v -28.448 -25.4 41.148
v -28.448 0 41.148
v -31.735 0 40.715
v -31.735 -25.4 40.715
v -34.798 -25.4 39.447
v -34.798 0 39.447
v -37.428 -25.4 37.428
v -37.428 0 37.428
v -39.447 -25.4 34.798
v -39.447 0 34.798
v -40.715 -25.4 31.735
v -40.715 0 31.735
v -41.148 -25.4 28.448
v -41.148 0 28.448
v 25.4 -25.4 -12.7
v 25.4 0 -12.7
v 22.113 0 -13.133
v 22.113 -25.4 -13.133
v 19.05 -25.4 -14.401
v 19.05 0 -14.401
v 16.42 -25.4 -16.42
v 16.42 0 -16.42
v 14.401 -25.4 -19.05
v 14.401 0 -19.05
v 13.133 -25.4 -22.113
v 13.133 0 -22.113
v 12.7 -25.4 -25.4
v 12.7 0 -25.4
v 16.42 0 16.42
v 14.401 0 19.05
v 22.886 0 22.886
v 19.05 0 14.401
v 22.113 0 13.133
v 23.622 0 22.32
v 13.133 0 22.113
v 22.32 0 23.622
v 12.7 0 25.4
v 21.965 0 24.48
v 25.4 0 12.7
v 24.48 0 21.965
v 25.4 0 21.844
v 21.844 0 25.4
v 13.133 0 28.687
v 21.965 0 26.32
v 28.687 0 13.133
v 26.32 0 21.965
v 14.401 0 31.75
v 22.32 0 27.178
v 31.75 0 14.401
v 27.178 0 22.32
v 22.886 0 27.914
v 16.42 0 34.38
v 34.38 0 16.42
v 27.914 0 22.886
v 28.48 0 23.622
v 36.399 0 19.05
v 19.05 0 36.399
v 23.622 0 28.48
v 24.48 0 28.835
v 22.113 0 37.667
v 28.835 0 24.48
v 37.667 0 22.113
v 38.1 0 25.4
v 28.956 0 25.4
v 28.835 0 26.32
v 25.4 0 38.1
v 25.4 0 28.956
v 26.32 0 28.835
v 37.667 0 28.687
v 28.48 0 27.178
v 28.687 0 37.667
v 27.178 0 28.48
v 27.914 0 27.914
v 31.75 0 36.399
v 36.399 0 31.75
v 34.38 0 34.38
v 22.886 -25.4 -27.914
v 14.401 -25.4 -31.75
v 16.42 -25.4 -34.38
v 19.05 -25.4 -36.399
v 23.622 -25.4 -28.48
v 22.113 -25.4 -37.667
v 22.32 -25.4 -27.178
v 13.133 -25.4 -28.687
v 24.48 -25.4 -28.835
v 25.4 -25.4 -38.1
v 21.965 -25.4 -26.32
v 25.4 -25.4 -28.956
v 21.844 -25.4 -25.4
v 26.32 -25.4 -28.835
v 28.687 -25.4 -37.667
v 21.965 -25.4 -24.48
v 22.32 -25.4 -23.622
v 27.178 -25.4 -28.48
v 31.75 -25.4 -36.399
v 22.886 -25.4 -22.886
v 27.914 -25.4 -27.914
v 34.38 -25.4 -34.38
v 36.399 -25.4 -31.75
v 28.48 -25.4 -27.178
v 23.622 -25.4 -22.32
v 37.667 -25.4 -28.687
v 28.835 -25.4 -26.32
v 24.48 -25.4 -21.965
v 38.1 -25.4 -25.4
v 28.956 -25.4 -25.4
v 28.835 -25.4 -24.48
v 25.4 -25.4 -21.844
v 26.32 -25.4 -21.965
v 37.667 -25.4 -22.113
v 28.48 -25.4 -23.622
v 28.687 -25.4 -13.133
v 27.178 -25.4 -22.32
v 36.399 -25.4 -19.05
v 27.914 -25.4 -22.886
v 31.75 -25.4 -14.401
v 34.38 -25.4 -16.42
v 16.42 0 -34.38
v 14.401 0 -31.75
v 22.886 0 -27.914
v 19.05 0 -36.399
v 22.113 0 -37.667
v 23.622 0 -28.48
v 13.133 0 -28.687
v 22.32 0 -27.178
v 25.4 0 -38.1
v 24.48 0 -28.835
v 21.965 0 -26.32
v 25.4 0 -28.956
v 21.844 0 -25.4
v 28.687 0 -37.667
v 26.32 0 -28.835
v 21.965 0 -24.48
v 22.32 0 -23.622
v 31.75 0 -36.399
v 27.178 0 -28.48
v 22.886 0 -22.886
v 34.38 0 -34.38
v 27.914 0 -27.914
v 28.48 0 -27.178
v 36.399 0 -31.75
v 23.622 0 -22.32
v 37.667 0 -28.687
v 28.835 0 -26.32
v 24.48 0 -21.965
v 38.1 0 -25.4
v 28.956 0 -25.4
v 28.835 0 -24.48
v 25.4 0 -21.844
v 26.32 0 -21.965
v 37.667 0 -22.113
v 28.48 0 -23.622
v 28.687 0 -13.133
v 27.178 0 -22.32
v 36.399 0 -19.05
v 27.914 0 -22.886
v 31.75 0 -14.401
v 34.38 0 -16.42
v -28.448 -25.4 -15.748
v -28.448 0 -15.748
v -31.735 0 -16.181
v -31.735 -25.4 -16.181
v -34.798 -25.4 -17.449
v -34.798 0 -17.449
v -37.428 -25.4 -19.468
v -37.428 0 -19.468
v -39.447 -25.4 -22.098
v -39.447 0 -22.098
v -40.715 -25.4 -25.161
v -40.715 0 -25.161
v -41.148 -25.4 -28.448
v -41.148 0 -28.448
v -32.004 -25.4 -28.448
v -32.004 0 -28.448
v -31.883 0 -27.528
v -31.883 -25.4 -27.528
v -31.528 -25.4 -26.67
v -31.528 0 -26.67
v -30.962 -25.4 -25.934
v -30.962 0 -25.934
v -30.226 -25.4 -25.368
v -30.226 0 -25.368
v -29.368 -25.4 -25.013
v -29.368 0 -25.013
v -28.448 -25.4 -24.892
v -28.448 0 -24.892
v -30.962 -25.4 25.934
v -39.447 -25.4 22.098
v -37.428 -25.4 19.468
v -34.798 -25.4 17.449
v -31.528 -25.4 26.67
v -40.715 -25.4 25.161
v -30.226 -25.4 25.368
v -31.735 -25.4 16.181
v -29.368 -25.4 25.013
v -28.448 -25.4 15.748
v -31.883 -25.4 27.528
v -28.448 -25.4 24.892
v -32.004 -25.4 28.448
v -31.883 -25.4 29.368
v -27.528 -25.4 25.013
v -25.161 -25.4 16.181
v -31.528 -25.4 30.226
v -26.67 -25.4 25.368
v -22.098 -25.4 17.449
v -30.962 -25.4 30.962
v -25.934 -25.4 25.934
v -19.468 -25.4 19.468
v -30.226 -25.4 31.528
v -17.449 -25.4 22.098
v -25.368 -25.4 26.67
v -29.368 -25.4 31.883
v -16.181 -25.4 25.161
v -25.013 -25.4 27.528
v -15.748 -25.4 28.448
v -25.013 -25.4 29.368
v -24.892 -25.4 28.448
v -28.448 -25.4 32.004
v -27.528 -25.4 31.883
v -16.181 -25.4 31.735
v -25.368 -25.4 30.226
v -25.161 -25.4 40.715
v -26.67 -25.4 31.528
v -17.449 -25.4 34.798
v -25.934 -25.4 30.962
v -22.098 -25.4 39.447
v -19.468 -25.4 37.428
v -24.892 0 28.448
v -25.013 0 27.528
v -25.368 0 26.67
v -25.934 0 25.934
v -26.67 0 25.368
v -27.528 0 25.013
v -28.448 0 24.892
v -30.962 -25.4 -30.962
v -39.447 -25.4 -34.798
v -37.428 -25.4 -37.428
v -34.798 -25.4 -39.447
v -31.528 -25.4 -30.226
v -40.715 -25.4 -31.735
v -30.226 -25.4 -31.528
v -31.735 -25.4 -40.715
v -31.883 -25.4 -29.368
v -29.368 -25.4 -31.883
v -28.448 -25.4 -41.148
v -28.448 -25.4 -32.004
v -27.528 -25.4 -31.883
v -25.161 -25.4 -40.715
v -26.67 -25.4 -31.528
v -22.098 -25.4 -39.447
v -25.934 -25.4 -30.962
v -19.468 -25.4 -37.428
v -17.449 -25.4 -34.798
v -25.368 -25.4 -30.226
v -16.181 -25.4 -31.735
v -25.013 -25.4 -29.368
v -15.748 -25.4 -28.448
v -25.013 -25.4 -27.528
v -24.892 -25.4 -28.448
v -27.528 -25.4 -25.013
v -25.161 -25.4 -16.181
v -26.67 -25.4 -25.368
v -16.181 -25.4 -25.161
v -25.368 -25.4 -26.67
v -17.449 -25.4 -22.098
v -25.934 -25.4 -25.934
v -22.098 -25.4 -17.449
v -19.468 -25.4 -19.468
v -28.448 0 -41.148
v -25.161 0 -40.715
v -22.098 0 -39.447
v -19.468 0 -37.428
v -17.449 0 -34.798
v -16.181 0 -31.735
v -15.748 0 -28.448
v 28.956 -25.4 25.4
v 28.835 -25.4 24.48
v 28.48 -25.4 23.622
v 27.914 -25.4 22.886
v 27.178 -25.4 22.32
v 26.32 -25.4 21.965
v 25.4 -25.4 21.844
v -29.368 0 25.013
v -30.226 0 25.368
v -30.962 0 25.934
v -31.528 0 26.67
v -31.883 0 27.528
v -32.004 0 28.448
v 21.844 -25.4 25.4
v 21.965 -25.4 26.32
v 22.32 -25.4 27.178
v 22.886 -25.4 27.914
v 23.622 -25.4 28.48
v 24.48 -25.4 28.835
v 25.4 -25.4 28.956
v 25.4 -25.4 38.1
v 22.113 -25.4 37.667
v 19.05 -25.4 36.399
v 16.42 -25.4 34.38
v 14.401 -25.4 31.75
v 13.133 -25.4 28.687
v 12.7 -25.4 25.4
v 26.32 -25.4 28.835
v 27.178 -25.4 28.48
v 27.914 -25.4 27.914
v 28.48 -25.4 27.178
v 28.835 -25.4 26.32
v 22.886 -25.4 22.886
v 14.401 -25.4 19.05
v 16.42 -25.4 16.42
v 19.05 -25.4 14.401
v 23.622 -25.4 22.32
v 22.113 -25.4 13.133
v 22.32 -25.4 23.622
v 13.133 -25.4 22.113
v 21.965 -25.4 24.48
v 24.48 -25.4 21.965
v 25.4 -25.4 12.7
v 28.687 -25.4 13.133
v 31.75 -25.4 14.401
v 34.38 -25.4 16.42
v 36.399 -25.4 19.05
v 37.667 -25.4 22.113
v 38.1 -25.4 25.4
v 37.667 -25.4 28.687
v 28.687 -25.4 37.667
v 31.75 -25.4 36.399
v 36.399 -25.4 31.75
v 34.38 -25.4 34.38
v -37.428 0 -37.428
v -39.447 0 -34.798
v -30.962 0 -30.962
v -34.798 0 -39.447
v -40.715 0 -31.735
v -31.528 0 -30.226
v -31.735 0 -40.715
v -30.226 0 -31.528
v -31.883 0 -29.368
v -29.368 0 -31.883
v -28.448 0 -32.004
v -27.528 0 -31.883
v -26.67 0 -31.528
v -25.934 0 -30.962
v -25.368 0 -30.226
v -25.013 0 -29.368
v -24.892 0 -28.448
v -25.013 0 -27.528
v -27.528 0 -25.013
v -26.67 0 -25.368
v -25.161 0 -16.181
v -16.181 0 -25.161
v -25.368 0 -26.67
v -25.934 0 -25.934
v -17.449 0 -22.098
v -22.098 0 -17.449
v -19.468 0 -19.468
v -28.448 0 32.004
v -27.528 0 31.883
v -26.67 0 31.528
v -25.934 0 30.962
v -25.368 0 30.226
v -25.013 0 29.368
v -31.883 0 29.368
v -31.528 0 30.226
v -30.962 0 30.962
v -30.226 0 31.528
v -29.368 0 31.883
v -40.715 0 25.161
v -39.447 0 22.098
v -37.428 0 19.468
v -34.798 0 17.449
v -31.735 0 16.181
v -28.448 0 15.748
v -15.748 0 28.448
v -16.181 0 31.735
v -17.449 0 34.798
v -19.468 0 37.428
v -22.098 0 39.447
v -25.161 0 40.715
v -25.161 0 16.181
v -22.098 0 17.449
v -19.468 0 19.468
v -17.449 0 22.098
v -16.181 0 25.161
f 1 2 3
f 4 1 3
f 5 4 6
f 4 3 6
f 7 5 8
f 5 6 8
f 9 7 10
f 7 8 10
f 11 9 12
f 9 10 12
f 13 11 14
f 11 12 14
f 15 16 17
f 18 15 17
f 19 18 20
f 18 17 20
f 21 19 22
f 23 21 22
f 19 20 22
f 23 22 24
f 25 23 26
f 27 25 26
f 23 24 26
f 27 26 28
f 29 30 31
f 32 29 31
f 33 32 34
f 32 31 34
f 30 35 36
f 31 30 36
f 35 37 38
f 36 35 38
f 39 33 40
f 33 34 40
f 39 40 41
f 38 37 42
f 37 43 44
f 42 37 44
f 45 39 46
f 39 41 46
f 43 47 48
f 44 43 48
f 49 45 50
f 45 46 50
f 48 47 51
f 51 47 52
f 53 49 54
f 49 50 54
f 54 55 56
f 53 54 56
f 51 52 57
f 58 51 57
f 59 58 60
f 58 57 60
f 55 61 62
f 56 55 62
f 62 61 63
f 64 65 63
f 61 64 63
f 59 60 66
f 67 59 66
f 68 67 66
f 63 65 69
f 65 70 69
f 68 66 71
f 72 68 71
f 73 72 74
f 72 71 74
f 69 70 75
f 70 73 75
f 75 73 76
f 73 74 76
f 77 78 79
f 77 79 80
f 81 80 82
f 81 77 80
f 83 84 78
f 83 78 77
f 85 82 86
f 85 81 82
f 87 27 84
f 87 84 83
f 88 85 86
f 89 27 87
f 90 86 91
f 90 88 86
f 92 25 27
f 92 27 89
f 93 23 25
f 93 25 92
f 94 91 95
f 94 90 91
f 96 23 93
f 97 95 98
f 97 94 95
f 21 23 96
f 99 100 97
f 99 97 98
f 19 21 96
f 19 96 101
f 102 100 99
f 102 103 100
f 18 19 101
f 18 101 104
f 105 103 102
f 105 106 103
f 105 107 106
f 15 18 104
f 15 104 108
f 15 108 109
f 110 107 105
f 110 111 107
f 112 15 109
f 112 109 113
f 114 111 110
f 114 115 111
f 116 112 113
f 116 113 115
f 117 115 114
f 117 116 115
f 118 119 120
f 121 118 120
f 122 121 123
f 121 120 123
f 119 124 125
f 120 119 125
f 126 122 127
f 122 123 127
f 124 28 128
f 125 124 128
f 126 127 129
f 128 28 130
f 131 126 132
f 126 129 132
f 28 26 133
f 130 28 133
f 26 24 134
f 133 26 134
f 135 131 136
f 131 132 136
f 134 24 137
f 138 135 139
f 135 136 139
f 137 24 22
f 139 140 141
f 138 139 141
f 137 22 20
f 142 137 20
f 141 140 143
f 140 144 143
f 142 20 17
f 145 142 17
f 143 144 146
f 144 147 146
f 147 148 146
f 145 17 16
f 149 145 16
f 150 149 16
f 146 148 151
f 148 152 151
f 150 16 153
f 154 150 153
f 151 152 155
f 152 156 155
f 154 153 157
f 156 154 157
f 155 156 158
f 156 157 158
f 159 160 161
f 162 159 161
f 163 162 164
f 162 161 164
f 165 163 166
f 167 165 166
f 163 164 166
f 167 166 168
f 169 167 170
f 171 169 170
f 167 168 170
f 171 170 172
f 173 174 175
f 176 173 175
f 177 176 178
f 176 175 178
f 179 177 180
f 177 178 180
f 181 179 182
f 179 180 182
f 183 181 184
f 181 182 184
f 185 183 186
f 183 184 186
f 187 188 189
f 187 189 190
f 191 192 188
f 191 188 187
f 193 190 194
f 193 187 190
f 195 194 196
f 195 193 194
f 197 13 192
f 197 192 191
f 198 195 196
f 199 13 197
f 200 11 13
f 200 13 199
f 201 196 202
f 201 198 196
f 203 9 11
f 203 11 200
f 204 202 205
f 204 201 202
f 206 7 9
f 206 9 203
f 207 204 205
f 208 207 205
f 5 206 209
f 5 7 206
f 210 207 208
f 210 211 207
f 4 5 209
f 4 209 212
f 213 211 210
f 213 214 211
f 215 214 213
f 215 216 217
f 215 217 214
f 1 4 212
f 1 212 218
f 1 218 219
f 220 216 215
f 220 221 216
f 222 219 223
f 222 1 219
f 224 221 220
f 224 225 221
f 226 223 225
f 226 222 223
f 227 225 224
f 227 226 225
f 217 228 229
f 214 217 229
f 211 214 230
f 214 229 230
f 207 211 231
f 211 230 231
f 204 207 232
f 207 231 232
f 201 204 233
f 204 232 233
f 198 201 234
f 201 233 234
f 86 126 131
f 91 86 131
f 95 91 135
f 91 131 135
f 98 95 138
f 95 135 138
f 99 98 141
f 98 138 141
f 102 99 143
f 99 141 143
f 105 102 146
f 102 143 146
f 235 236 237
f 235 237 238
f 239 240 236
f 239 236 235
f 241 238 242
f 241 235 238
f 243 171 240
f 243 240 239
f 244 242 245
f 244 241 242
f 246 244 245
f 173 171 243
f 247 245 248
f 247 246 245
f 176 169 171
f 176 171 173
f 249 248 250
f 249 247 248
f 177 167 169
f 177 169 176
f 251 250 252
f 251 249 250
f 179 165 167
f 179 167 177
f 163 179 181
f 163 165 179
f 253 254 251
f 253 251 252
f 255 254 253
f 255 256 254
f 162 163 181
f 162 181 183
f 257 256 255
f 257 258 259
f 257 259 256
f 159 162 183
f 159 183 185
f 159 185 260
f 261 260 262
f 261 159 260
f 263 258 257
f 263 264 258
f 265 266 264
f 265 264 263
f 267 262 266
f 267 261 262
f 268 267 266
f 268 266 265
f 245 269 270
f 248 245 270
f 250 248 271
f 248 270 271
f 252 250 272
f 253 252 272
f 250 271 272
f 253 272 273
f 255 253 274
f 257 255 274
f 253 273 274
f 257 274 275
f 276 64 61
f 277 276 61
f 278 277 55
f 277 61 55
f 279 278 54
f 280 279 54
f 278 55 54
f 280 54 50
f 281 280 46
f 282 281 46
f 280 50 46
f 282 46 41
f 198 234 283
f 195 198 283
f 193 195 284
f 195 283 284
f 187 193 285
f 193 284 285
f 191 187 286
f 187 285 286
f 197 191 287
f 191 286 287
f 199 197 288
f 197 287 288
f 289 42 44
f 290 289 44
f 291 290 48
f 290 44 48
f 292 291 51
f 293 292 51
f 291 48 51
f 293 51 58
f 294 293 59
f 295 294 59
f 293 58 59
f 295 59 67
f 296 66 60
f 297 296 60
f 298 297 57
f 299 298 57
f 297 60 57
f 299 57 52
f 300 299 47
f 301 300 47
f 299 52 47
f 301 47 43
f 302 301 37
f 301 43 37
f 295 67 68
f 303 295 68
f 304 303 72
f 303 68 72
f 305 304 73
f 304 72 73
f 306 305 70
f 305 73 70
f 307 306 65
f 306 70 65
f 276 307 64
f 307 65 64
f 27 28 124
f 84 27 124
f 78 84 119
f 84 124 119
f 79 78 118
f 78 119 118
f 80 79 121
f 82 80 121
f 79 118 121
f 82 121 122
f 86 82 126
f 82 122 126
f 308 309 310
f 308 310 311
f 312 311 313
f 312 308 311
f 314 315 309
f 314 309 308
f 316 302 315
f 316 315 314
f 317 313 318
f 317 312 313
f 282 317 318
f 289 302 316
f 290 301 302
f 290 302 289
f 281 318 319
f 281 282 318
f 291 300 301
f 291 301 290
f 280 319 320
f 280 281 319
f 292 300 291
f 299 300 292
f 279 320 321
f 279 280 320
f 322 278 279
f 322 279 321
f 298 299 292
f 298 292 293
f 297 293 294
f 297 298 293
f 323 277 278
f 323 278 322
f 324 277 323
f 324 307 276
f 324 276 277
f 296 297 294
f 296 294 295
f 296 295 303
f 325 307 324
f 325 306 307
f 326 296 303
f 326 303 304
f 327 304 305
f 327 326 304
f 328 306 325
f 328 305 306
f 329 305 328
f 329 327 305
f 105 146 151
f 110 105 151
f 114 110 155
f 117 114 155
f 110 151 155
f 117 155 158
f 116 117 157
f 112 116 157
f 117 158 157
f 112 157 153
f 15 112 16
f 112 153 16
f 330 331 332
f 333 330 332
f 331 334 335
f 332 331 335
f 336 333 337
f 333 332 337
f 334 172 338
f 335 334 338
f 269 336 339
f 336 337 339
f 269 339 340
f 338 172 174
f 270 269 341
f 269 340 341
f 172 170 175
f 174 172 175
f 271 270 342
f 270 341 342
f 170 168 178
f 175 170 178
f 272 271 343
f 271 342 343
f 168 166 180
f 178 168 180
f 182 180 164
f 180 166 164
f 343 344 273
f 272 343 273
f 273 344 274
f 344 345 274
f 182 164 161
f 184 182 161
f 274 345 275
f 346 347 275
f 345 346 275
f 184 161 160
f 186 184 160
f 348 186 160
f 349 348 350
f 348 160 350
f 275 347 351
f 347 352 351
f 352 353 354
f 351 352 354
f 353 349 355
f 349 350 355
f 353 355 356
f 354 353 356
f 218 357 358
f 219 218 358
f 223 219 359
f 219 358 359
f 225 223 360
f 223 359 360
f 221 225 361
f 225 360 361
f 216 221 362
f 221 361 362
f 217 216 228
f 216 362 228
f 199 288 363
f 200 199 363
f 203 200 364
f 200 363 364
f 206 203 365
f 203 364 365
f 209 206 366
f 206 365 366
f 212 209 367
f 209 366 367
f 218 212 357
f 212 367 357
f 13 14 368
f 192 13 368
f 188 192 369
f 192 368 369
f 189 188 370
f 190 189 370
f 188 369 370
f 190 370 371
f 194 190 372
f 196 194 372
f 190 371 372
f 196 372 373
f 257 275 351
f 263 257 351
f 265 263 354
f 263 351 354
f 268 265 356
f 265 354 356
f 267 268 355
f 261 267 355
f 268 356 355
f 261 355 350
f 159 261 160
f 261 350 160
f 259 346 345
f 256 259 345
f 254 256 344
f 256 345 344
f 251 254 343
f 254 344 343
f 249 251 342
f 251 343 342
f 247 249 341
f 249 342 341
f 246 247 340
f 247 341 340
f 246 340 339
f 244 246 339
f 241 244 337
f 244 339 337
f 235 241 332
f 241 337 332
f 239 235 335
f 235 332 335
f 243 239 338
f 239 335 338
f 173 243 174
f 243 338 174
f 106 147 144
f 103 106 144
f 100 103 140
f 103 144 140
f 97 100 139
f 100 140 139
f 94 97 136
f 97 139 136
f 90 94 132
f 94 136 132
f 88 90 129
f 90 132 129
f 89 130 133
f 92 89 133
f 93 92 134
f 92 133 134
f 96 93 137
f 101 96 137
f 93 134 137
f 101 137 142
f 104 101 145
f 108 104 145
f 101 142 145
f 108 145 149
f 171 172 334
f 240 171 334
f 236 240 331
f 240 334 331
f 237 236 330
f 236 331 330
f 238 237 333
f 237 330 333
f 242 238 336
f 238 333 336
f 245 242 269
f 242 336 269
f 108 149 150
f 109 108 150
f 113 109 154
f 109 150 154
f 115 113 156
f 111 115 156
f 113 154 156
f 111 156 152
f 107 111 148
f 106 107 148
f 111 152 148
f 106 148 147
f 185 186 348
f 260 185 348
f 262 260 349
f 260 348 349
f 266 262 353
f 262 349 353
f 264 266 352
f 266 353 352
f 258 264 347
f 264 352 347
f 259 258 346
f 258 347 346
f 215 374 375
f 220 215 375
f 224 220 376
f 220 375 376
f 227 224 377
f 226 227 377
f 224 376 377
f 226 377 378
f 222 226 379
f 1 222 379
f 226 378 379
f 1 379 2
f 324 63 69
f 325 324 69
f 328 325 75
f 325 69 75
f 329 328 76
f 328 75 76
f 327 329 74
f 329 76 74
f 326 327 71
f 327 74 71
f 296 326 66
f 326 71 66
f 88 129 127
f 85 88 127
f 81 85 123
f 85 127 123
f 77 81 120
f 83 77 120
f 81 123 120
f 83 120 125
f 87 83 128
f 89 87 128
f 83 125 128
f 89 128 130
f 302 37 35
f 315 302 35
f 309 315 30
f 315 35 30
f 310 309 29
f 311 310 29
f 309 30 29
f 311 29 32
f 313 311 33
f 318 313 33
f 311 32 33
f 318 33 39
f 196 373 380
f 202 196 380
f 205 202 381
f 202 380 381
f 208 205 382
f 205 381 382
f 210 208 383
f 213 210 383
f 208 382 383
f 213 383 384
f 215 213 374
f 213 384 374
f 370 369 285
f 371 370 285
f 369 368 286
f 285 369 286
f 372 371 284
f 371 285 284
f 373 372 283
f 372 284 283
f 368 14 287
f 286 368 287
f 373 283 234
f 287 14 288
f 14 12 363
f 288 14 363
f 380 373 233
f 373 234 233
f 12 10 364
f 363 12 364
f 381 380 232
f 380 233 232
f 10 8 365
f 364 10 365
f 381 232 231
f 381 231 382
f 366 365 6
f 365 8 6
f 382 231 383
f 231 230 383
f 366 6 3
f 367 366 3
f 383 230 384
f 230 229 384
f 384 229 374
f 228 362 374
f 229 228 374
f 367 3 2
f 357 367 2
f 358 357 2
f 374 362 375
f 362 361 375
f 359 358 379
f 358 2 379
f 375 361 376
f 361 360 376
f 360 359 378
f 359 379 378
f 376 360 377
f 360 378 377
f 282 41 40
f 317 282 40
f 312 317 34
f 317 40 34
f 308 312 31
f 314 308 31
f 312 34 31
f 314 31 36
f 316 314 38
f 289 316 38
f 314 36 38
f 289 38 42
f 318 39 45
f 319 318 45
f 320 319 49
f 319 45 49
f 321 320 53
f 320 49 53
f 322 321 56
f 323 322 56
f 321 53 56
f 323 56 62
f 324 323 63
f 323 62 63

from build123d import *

# Parameters (mm, degrees)
F1_DEPTH = 25.4
F3_DEPTH = 25.4
F5_DEPTH = 25.4
F7_DEPTH = 25.4


# Not quite as in the source:
# - a feature names something its author has since deleted; it is built from what else it names


with BuildPart() as f1:
    # F0 (on Front) → F1 (new body)
    with BuildSketch(Plane.XZ):
        with BuildLine():
            Line((28.956, 25.4), (38.1, 25.4))
            ThreePointArc((38.1, 25.4), (34.3802561211, 34.3802561211), (25.4, 38.1))
            Line((25.4, 38.1), (25.4, 28.956))
            ThreePointArc((25.4, 28.956), (27.9144717139, 27.9144717139), (28.956, 25.4))
        make_face()
        with BuildLine():
            ThreePointArc((25.4, 38.1), (16.4197438789, 34.3802561211), (12.7, 25.4))
            Line((12.7, 25.4), (21.844, 25.4))
            ThreePointArc((21.844, 25.4), (22.8855282861, 27.9144717139), (25.4, 28.956))
            Line((25.4, 28.956), (25.4, 38.1))
        make_face()
        with BuildLine():
            ThreePointArc((12.7, 25.4), (16.4197438789, 16.4197438789), (25.4, 12.7))
            Line((25.4, 12.7), (25.4, 21.844))
            ThreePointArc((25.4, 21.844), (22.8855282861, 22.8855282861), (21.844, 25.4))
            Line((21.844, 25.4), (12.7, 25.4))
        make_face()
        with BuildLine():
            Line((25.4, 21.844), (25.4, 12.7))
            ThreePointArc((25.4, 12.7), (34.3802561211, 16.4197438789), (38.1, 25.4))
            Line((38.1, 25.4), (28.956, 25.4))
            ThreePointArc((28.956, 25.4), (27.9144717139, 22.8855282861), (25.4, 21.844))
        make_face()
    extrude(amount=F1_DEPTH)


with BuildPart() as f3:
    # F2 (on Front) → F3 (new body)
    with BuildSketch(Plane.XZ):
        with BuildLine():
            ThreePointArc((25.4, -38.1), (34.3802561211, -34.3802561211), (38.1, -25.4))
            Line((38.1, -25.4), (28.956, -25.4))
            ThreePointArc((28.956, -25.4), (27.9144717139, -27.9144717139), (25.4, -28.956))
            Line((25.4, -28.956), (25.4, -38.1))
        make_face()
        with BuildLine():
            Line((21.844, -25.4), (12.7, -25.4))
            ThreePointArc((12.7, -25.4), (16.4197438789, -34.3802561211), (25.4, -38.1))
            Line((25.4, -38.1), (25.4, -28.956))
            ThreePointArc((25.4, -28.956), (22.8855282861, -27.9144717139), (21.844, -25.4))
        make_face()
        with BuildLine():
            Line((25.4, -21.844), (25.4, -12.7))
            ThreePointArc((25.4, -12.7), (16.4197438789, -16.4197438789), (12.7, -25.4))
            Line((12.7, -25.4), (21.844, -25.4))
            ThreePointArc((21.844, -25.4), (22.8855282861, -22.8855282861), (25.4, -21.844))
        make_face()
        with BuildLine():
            ThreePointArc((38.1, -25.4), (34.3802561211, -16.4197438789), (25.4, -12.7))
            Line((25.4, -12.7), (25.4, -21.844))
            ThreePointArc((25.4, -21.844), (27.9144717139, -22.8855282861), (28.956, -25.4))
            Line((28.956, -25.4), (38.1, -25.4))
        make_face()
    extrude(amount=F3_DEPTH)


with BuildPart() as f5:
    # F4 (on Front) → F5 (new body)
    with BuildSketch(Plane.XZ):
        with BuildLine():
            ThreePointArc((-28.448, 41.148), (-37.4282561211, 37.4282561211), (-41.148, 28.448))
            Line((-41.148, 28.448), (-32.004, 28.448))
            ThreePointArc((-32.004, 28.448), (-30.9624717139, 30.9624717139), (-28.448, 32.004))
            Line((-28.448, 32.004), (-28.448, 41.148))
        make_face()
        with BuildLine():
            Line((-24.892, 28.448), (-15.748, 28.448))
            ThreePointArc((-15.748, 28.448), (-19.4677438789, 37.4282561211), (-28.448, 41.148))
            Line((-28.448, 41.148), (-28.448, 32.004))
            ThreePointArc((-28.448, 32.004), (-25.9335282861, 30.9624717139), (-24.892, 28.448))
        make_face()
        with BuildLine():
            Line((-28.448, 24.892), (-28.448, 15.748))
            ThreePointArc((-28.448, 15.748), (-19.4677438789, 19.4677438789), (-15.748, 28.448))
            Line((-15.748, 28.448), (-24.892, 28.448))
            ThreePointArc((-24.892, 28.448), (-25.9335282861, 25.9335282861), (-28.448, 24.892))
        make_face()
        with BuildLine():
            ThreePointArc((-41.148, 28.448), (-37.4282561211, 19.4677438789), (-28.448, 15.748))
            Line((-28.448, 15.748), (-28.448, 24.892))
            ThreePointArc((-28.448, 24.892), (-30.9624717139, 25.9335282861), (-32.004, 28.448))
            Line((-32.004, 28.448), (-41.148, 28.448))
        make_face()
    extrude(amount=F5_DEPTH)


with BuildPart() as f7:
    # F6 (on Front) → F7 (new body)
    with BuildSketch(Plane.XZ):
        with BuildLine():
            Line((-28.448, -24.892), (-28.448, -15.748))
            ThreePointArc((-28.448, -15.748), (-37.4282561211, -19.4677438789), (-41.148, -28.448))
            Line((-41.148, -28.448), (-32.004, -28.448))
            ThreePointArc((-32.004, -28.448), (-30.9624717139, -25.9335282861), (-28.448, -24.892))
        make_face()
        with BuildLine():
            Line((-24.892, -28.448), (-15.748, -28.448))
            ThreePointArc((-15.748, -28.448), (-19.4677438789, -19.4677438789), (-28.448, -15.748))
            Line((-28.448, -15.748), (-28.448, -24.892))
            ThreePointArc((-28.448, -24.892), (-25.9335282861, -25.9335282861), (-24.892, -28.448))
        make_face()
        with BuildLine():
            ThreePointArc((-28.448, -41.148), (-19.4677438789, -37.4282561211), (-15.748, -28.448))
            Line((-15.748, -28.448), (-24.892, -28.448))
            ThreePointArc((-24.892, -28.448), (-25.9335282861, -30.9624717139), (-28.448, -32.004))
            Line((-28.448, -32.004), (-28.448, -41.148))
        make_face()
        with BuildLine():
            ThreePointArc((-41.148, -28.448), (-37.4282561211, -37.4282561211), (-28.448, -41.148))
            Line((-28.448, -41.148), (-28.448, -32.004))
            ThreePointArc((-28.448, -32.004), (-30.9624717139, -30.9624717139), (-32.004, -28.448))
            Line((-32.004, -28.448), (-41.148, -28.448))
        make_face()
    extrude(amount=F7_DEPTH)


solid = Compound([f1.part, f3.part, f5.part, f7.part])
